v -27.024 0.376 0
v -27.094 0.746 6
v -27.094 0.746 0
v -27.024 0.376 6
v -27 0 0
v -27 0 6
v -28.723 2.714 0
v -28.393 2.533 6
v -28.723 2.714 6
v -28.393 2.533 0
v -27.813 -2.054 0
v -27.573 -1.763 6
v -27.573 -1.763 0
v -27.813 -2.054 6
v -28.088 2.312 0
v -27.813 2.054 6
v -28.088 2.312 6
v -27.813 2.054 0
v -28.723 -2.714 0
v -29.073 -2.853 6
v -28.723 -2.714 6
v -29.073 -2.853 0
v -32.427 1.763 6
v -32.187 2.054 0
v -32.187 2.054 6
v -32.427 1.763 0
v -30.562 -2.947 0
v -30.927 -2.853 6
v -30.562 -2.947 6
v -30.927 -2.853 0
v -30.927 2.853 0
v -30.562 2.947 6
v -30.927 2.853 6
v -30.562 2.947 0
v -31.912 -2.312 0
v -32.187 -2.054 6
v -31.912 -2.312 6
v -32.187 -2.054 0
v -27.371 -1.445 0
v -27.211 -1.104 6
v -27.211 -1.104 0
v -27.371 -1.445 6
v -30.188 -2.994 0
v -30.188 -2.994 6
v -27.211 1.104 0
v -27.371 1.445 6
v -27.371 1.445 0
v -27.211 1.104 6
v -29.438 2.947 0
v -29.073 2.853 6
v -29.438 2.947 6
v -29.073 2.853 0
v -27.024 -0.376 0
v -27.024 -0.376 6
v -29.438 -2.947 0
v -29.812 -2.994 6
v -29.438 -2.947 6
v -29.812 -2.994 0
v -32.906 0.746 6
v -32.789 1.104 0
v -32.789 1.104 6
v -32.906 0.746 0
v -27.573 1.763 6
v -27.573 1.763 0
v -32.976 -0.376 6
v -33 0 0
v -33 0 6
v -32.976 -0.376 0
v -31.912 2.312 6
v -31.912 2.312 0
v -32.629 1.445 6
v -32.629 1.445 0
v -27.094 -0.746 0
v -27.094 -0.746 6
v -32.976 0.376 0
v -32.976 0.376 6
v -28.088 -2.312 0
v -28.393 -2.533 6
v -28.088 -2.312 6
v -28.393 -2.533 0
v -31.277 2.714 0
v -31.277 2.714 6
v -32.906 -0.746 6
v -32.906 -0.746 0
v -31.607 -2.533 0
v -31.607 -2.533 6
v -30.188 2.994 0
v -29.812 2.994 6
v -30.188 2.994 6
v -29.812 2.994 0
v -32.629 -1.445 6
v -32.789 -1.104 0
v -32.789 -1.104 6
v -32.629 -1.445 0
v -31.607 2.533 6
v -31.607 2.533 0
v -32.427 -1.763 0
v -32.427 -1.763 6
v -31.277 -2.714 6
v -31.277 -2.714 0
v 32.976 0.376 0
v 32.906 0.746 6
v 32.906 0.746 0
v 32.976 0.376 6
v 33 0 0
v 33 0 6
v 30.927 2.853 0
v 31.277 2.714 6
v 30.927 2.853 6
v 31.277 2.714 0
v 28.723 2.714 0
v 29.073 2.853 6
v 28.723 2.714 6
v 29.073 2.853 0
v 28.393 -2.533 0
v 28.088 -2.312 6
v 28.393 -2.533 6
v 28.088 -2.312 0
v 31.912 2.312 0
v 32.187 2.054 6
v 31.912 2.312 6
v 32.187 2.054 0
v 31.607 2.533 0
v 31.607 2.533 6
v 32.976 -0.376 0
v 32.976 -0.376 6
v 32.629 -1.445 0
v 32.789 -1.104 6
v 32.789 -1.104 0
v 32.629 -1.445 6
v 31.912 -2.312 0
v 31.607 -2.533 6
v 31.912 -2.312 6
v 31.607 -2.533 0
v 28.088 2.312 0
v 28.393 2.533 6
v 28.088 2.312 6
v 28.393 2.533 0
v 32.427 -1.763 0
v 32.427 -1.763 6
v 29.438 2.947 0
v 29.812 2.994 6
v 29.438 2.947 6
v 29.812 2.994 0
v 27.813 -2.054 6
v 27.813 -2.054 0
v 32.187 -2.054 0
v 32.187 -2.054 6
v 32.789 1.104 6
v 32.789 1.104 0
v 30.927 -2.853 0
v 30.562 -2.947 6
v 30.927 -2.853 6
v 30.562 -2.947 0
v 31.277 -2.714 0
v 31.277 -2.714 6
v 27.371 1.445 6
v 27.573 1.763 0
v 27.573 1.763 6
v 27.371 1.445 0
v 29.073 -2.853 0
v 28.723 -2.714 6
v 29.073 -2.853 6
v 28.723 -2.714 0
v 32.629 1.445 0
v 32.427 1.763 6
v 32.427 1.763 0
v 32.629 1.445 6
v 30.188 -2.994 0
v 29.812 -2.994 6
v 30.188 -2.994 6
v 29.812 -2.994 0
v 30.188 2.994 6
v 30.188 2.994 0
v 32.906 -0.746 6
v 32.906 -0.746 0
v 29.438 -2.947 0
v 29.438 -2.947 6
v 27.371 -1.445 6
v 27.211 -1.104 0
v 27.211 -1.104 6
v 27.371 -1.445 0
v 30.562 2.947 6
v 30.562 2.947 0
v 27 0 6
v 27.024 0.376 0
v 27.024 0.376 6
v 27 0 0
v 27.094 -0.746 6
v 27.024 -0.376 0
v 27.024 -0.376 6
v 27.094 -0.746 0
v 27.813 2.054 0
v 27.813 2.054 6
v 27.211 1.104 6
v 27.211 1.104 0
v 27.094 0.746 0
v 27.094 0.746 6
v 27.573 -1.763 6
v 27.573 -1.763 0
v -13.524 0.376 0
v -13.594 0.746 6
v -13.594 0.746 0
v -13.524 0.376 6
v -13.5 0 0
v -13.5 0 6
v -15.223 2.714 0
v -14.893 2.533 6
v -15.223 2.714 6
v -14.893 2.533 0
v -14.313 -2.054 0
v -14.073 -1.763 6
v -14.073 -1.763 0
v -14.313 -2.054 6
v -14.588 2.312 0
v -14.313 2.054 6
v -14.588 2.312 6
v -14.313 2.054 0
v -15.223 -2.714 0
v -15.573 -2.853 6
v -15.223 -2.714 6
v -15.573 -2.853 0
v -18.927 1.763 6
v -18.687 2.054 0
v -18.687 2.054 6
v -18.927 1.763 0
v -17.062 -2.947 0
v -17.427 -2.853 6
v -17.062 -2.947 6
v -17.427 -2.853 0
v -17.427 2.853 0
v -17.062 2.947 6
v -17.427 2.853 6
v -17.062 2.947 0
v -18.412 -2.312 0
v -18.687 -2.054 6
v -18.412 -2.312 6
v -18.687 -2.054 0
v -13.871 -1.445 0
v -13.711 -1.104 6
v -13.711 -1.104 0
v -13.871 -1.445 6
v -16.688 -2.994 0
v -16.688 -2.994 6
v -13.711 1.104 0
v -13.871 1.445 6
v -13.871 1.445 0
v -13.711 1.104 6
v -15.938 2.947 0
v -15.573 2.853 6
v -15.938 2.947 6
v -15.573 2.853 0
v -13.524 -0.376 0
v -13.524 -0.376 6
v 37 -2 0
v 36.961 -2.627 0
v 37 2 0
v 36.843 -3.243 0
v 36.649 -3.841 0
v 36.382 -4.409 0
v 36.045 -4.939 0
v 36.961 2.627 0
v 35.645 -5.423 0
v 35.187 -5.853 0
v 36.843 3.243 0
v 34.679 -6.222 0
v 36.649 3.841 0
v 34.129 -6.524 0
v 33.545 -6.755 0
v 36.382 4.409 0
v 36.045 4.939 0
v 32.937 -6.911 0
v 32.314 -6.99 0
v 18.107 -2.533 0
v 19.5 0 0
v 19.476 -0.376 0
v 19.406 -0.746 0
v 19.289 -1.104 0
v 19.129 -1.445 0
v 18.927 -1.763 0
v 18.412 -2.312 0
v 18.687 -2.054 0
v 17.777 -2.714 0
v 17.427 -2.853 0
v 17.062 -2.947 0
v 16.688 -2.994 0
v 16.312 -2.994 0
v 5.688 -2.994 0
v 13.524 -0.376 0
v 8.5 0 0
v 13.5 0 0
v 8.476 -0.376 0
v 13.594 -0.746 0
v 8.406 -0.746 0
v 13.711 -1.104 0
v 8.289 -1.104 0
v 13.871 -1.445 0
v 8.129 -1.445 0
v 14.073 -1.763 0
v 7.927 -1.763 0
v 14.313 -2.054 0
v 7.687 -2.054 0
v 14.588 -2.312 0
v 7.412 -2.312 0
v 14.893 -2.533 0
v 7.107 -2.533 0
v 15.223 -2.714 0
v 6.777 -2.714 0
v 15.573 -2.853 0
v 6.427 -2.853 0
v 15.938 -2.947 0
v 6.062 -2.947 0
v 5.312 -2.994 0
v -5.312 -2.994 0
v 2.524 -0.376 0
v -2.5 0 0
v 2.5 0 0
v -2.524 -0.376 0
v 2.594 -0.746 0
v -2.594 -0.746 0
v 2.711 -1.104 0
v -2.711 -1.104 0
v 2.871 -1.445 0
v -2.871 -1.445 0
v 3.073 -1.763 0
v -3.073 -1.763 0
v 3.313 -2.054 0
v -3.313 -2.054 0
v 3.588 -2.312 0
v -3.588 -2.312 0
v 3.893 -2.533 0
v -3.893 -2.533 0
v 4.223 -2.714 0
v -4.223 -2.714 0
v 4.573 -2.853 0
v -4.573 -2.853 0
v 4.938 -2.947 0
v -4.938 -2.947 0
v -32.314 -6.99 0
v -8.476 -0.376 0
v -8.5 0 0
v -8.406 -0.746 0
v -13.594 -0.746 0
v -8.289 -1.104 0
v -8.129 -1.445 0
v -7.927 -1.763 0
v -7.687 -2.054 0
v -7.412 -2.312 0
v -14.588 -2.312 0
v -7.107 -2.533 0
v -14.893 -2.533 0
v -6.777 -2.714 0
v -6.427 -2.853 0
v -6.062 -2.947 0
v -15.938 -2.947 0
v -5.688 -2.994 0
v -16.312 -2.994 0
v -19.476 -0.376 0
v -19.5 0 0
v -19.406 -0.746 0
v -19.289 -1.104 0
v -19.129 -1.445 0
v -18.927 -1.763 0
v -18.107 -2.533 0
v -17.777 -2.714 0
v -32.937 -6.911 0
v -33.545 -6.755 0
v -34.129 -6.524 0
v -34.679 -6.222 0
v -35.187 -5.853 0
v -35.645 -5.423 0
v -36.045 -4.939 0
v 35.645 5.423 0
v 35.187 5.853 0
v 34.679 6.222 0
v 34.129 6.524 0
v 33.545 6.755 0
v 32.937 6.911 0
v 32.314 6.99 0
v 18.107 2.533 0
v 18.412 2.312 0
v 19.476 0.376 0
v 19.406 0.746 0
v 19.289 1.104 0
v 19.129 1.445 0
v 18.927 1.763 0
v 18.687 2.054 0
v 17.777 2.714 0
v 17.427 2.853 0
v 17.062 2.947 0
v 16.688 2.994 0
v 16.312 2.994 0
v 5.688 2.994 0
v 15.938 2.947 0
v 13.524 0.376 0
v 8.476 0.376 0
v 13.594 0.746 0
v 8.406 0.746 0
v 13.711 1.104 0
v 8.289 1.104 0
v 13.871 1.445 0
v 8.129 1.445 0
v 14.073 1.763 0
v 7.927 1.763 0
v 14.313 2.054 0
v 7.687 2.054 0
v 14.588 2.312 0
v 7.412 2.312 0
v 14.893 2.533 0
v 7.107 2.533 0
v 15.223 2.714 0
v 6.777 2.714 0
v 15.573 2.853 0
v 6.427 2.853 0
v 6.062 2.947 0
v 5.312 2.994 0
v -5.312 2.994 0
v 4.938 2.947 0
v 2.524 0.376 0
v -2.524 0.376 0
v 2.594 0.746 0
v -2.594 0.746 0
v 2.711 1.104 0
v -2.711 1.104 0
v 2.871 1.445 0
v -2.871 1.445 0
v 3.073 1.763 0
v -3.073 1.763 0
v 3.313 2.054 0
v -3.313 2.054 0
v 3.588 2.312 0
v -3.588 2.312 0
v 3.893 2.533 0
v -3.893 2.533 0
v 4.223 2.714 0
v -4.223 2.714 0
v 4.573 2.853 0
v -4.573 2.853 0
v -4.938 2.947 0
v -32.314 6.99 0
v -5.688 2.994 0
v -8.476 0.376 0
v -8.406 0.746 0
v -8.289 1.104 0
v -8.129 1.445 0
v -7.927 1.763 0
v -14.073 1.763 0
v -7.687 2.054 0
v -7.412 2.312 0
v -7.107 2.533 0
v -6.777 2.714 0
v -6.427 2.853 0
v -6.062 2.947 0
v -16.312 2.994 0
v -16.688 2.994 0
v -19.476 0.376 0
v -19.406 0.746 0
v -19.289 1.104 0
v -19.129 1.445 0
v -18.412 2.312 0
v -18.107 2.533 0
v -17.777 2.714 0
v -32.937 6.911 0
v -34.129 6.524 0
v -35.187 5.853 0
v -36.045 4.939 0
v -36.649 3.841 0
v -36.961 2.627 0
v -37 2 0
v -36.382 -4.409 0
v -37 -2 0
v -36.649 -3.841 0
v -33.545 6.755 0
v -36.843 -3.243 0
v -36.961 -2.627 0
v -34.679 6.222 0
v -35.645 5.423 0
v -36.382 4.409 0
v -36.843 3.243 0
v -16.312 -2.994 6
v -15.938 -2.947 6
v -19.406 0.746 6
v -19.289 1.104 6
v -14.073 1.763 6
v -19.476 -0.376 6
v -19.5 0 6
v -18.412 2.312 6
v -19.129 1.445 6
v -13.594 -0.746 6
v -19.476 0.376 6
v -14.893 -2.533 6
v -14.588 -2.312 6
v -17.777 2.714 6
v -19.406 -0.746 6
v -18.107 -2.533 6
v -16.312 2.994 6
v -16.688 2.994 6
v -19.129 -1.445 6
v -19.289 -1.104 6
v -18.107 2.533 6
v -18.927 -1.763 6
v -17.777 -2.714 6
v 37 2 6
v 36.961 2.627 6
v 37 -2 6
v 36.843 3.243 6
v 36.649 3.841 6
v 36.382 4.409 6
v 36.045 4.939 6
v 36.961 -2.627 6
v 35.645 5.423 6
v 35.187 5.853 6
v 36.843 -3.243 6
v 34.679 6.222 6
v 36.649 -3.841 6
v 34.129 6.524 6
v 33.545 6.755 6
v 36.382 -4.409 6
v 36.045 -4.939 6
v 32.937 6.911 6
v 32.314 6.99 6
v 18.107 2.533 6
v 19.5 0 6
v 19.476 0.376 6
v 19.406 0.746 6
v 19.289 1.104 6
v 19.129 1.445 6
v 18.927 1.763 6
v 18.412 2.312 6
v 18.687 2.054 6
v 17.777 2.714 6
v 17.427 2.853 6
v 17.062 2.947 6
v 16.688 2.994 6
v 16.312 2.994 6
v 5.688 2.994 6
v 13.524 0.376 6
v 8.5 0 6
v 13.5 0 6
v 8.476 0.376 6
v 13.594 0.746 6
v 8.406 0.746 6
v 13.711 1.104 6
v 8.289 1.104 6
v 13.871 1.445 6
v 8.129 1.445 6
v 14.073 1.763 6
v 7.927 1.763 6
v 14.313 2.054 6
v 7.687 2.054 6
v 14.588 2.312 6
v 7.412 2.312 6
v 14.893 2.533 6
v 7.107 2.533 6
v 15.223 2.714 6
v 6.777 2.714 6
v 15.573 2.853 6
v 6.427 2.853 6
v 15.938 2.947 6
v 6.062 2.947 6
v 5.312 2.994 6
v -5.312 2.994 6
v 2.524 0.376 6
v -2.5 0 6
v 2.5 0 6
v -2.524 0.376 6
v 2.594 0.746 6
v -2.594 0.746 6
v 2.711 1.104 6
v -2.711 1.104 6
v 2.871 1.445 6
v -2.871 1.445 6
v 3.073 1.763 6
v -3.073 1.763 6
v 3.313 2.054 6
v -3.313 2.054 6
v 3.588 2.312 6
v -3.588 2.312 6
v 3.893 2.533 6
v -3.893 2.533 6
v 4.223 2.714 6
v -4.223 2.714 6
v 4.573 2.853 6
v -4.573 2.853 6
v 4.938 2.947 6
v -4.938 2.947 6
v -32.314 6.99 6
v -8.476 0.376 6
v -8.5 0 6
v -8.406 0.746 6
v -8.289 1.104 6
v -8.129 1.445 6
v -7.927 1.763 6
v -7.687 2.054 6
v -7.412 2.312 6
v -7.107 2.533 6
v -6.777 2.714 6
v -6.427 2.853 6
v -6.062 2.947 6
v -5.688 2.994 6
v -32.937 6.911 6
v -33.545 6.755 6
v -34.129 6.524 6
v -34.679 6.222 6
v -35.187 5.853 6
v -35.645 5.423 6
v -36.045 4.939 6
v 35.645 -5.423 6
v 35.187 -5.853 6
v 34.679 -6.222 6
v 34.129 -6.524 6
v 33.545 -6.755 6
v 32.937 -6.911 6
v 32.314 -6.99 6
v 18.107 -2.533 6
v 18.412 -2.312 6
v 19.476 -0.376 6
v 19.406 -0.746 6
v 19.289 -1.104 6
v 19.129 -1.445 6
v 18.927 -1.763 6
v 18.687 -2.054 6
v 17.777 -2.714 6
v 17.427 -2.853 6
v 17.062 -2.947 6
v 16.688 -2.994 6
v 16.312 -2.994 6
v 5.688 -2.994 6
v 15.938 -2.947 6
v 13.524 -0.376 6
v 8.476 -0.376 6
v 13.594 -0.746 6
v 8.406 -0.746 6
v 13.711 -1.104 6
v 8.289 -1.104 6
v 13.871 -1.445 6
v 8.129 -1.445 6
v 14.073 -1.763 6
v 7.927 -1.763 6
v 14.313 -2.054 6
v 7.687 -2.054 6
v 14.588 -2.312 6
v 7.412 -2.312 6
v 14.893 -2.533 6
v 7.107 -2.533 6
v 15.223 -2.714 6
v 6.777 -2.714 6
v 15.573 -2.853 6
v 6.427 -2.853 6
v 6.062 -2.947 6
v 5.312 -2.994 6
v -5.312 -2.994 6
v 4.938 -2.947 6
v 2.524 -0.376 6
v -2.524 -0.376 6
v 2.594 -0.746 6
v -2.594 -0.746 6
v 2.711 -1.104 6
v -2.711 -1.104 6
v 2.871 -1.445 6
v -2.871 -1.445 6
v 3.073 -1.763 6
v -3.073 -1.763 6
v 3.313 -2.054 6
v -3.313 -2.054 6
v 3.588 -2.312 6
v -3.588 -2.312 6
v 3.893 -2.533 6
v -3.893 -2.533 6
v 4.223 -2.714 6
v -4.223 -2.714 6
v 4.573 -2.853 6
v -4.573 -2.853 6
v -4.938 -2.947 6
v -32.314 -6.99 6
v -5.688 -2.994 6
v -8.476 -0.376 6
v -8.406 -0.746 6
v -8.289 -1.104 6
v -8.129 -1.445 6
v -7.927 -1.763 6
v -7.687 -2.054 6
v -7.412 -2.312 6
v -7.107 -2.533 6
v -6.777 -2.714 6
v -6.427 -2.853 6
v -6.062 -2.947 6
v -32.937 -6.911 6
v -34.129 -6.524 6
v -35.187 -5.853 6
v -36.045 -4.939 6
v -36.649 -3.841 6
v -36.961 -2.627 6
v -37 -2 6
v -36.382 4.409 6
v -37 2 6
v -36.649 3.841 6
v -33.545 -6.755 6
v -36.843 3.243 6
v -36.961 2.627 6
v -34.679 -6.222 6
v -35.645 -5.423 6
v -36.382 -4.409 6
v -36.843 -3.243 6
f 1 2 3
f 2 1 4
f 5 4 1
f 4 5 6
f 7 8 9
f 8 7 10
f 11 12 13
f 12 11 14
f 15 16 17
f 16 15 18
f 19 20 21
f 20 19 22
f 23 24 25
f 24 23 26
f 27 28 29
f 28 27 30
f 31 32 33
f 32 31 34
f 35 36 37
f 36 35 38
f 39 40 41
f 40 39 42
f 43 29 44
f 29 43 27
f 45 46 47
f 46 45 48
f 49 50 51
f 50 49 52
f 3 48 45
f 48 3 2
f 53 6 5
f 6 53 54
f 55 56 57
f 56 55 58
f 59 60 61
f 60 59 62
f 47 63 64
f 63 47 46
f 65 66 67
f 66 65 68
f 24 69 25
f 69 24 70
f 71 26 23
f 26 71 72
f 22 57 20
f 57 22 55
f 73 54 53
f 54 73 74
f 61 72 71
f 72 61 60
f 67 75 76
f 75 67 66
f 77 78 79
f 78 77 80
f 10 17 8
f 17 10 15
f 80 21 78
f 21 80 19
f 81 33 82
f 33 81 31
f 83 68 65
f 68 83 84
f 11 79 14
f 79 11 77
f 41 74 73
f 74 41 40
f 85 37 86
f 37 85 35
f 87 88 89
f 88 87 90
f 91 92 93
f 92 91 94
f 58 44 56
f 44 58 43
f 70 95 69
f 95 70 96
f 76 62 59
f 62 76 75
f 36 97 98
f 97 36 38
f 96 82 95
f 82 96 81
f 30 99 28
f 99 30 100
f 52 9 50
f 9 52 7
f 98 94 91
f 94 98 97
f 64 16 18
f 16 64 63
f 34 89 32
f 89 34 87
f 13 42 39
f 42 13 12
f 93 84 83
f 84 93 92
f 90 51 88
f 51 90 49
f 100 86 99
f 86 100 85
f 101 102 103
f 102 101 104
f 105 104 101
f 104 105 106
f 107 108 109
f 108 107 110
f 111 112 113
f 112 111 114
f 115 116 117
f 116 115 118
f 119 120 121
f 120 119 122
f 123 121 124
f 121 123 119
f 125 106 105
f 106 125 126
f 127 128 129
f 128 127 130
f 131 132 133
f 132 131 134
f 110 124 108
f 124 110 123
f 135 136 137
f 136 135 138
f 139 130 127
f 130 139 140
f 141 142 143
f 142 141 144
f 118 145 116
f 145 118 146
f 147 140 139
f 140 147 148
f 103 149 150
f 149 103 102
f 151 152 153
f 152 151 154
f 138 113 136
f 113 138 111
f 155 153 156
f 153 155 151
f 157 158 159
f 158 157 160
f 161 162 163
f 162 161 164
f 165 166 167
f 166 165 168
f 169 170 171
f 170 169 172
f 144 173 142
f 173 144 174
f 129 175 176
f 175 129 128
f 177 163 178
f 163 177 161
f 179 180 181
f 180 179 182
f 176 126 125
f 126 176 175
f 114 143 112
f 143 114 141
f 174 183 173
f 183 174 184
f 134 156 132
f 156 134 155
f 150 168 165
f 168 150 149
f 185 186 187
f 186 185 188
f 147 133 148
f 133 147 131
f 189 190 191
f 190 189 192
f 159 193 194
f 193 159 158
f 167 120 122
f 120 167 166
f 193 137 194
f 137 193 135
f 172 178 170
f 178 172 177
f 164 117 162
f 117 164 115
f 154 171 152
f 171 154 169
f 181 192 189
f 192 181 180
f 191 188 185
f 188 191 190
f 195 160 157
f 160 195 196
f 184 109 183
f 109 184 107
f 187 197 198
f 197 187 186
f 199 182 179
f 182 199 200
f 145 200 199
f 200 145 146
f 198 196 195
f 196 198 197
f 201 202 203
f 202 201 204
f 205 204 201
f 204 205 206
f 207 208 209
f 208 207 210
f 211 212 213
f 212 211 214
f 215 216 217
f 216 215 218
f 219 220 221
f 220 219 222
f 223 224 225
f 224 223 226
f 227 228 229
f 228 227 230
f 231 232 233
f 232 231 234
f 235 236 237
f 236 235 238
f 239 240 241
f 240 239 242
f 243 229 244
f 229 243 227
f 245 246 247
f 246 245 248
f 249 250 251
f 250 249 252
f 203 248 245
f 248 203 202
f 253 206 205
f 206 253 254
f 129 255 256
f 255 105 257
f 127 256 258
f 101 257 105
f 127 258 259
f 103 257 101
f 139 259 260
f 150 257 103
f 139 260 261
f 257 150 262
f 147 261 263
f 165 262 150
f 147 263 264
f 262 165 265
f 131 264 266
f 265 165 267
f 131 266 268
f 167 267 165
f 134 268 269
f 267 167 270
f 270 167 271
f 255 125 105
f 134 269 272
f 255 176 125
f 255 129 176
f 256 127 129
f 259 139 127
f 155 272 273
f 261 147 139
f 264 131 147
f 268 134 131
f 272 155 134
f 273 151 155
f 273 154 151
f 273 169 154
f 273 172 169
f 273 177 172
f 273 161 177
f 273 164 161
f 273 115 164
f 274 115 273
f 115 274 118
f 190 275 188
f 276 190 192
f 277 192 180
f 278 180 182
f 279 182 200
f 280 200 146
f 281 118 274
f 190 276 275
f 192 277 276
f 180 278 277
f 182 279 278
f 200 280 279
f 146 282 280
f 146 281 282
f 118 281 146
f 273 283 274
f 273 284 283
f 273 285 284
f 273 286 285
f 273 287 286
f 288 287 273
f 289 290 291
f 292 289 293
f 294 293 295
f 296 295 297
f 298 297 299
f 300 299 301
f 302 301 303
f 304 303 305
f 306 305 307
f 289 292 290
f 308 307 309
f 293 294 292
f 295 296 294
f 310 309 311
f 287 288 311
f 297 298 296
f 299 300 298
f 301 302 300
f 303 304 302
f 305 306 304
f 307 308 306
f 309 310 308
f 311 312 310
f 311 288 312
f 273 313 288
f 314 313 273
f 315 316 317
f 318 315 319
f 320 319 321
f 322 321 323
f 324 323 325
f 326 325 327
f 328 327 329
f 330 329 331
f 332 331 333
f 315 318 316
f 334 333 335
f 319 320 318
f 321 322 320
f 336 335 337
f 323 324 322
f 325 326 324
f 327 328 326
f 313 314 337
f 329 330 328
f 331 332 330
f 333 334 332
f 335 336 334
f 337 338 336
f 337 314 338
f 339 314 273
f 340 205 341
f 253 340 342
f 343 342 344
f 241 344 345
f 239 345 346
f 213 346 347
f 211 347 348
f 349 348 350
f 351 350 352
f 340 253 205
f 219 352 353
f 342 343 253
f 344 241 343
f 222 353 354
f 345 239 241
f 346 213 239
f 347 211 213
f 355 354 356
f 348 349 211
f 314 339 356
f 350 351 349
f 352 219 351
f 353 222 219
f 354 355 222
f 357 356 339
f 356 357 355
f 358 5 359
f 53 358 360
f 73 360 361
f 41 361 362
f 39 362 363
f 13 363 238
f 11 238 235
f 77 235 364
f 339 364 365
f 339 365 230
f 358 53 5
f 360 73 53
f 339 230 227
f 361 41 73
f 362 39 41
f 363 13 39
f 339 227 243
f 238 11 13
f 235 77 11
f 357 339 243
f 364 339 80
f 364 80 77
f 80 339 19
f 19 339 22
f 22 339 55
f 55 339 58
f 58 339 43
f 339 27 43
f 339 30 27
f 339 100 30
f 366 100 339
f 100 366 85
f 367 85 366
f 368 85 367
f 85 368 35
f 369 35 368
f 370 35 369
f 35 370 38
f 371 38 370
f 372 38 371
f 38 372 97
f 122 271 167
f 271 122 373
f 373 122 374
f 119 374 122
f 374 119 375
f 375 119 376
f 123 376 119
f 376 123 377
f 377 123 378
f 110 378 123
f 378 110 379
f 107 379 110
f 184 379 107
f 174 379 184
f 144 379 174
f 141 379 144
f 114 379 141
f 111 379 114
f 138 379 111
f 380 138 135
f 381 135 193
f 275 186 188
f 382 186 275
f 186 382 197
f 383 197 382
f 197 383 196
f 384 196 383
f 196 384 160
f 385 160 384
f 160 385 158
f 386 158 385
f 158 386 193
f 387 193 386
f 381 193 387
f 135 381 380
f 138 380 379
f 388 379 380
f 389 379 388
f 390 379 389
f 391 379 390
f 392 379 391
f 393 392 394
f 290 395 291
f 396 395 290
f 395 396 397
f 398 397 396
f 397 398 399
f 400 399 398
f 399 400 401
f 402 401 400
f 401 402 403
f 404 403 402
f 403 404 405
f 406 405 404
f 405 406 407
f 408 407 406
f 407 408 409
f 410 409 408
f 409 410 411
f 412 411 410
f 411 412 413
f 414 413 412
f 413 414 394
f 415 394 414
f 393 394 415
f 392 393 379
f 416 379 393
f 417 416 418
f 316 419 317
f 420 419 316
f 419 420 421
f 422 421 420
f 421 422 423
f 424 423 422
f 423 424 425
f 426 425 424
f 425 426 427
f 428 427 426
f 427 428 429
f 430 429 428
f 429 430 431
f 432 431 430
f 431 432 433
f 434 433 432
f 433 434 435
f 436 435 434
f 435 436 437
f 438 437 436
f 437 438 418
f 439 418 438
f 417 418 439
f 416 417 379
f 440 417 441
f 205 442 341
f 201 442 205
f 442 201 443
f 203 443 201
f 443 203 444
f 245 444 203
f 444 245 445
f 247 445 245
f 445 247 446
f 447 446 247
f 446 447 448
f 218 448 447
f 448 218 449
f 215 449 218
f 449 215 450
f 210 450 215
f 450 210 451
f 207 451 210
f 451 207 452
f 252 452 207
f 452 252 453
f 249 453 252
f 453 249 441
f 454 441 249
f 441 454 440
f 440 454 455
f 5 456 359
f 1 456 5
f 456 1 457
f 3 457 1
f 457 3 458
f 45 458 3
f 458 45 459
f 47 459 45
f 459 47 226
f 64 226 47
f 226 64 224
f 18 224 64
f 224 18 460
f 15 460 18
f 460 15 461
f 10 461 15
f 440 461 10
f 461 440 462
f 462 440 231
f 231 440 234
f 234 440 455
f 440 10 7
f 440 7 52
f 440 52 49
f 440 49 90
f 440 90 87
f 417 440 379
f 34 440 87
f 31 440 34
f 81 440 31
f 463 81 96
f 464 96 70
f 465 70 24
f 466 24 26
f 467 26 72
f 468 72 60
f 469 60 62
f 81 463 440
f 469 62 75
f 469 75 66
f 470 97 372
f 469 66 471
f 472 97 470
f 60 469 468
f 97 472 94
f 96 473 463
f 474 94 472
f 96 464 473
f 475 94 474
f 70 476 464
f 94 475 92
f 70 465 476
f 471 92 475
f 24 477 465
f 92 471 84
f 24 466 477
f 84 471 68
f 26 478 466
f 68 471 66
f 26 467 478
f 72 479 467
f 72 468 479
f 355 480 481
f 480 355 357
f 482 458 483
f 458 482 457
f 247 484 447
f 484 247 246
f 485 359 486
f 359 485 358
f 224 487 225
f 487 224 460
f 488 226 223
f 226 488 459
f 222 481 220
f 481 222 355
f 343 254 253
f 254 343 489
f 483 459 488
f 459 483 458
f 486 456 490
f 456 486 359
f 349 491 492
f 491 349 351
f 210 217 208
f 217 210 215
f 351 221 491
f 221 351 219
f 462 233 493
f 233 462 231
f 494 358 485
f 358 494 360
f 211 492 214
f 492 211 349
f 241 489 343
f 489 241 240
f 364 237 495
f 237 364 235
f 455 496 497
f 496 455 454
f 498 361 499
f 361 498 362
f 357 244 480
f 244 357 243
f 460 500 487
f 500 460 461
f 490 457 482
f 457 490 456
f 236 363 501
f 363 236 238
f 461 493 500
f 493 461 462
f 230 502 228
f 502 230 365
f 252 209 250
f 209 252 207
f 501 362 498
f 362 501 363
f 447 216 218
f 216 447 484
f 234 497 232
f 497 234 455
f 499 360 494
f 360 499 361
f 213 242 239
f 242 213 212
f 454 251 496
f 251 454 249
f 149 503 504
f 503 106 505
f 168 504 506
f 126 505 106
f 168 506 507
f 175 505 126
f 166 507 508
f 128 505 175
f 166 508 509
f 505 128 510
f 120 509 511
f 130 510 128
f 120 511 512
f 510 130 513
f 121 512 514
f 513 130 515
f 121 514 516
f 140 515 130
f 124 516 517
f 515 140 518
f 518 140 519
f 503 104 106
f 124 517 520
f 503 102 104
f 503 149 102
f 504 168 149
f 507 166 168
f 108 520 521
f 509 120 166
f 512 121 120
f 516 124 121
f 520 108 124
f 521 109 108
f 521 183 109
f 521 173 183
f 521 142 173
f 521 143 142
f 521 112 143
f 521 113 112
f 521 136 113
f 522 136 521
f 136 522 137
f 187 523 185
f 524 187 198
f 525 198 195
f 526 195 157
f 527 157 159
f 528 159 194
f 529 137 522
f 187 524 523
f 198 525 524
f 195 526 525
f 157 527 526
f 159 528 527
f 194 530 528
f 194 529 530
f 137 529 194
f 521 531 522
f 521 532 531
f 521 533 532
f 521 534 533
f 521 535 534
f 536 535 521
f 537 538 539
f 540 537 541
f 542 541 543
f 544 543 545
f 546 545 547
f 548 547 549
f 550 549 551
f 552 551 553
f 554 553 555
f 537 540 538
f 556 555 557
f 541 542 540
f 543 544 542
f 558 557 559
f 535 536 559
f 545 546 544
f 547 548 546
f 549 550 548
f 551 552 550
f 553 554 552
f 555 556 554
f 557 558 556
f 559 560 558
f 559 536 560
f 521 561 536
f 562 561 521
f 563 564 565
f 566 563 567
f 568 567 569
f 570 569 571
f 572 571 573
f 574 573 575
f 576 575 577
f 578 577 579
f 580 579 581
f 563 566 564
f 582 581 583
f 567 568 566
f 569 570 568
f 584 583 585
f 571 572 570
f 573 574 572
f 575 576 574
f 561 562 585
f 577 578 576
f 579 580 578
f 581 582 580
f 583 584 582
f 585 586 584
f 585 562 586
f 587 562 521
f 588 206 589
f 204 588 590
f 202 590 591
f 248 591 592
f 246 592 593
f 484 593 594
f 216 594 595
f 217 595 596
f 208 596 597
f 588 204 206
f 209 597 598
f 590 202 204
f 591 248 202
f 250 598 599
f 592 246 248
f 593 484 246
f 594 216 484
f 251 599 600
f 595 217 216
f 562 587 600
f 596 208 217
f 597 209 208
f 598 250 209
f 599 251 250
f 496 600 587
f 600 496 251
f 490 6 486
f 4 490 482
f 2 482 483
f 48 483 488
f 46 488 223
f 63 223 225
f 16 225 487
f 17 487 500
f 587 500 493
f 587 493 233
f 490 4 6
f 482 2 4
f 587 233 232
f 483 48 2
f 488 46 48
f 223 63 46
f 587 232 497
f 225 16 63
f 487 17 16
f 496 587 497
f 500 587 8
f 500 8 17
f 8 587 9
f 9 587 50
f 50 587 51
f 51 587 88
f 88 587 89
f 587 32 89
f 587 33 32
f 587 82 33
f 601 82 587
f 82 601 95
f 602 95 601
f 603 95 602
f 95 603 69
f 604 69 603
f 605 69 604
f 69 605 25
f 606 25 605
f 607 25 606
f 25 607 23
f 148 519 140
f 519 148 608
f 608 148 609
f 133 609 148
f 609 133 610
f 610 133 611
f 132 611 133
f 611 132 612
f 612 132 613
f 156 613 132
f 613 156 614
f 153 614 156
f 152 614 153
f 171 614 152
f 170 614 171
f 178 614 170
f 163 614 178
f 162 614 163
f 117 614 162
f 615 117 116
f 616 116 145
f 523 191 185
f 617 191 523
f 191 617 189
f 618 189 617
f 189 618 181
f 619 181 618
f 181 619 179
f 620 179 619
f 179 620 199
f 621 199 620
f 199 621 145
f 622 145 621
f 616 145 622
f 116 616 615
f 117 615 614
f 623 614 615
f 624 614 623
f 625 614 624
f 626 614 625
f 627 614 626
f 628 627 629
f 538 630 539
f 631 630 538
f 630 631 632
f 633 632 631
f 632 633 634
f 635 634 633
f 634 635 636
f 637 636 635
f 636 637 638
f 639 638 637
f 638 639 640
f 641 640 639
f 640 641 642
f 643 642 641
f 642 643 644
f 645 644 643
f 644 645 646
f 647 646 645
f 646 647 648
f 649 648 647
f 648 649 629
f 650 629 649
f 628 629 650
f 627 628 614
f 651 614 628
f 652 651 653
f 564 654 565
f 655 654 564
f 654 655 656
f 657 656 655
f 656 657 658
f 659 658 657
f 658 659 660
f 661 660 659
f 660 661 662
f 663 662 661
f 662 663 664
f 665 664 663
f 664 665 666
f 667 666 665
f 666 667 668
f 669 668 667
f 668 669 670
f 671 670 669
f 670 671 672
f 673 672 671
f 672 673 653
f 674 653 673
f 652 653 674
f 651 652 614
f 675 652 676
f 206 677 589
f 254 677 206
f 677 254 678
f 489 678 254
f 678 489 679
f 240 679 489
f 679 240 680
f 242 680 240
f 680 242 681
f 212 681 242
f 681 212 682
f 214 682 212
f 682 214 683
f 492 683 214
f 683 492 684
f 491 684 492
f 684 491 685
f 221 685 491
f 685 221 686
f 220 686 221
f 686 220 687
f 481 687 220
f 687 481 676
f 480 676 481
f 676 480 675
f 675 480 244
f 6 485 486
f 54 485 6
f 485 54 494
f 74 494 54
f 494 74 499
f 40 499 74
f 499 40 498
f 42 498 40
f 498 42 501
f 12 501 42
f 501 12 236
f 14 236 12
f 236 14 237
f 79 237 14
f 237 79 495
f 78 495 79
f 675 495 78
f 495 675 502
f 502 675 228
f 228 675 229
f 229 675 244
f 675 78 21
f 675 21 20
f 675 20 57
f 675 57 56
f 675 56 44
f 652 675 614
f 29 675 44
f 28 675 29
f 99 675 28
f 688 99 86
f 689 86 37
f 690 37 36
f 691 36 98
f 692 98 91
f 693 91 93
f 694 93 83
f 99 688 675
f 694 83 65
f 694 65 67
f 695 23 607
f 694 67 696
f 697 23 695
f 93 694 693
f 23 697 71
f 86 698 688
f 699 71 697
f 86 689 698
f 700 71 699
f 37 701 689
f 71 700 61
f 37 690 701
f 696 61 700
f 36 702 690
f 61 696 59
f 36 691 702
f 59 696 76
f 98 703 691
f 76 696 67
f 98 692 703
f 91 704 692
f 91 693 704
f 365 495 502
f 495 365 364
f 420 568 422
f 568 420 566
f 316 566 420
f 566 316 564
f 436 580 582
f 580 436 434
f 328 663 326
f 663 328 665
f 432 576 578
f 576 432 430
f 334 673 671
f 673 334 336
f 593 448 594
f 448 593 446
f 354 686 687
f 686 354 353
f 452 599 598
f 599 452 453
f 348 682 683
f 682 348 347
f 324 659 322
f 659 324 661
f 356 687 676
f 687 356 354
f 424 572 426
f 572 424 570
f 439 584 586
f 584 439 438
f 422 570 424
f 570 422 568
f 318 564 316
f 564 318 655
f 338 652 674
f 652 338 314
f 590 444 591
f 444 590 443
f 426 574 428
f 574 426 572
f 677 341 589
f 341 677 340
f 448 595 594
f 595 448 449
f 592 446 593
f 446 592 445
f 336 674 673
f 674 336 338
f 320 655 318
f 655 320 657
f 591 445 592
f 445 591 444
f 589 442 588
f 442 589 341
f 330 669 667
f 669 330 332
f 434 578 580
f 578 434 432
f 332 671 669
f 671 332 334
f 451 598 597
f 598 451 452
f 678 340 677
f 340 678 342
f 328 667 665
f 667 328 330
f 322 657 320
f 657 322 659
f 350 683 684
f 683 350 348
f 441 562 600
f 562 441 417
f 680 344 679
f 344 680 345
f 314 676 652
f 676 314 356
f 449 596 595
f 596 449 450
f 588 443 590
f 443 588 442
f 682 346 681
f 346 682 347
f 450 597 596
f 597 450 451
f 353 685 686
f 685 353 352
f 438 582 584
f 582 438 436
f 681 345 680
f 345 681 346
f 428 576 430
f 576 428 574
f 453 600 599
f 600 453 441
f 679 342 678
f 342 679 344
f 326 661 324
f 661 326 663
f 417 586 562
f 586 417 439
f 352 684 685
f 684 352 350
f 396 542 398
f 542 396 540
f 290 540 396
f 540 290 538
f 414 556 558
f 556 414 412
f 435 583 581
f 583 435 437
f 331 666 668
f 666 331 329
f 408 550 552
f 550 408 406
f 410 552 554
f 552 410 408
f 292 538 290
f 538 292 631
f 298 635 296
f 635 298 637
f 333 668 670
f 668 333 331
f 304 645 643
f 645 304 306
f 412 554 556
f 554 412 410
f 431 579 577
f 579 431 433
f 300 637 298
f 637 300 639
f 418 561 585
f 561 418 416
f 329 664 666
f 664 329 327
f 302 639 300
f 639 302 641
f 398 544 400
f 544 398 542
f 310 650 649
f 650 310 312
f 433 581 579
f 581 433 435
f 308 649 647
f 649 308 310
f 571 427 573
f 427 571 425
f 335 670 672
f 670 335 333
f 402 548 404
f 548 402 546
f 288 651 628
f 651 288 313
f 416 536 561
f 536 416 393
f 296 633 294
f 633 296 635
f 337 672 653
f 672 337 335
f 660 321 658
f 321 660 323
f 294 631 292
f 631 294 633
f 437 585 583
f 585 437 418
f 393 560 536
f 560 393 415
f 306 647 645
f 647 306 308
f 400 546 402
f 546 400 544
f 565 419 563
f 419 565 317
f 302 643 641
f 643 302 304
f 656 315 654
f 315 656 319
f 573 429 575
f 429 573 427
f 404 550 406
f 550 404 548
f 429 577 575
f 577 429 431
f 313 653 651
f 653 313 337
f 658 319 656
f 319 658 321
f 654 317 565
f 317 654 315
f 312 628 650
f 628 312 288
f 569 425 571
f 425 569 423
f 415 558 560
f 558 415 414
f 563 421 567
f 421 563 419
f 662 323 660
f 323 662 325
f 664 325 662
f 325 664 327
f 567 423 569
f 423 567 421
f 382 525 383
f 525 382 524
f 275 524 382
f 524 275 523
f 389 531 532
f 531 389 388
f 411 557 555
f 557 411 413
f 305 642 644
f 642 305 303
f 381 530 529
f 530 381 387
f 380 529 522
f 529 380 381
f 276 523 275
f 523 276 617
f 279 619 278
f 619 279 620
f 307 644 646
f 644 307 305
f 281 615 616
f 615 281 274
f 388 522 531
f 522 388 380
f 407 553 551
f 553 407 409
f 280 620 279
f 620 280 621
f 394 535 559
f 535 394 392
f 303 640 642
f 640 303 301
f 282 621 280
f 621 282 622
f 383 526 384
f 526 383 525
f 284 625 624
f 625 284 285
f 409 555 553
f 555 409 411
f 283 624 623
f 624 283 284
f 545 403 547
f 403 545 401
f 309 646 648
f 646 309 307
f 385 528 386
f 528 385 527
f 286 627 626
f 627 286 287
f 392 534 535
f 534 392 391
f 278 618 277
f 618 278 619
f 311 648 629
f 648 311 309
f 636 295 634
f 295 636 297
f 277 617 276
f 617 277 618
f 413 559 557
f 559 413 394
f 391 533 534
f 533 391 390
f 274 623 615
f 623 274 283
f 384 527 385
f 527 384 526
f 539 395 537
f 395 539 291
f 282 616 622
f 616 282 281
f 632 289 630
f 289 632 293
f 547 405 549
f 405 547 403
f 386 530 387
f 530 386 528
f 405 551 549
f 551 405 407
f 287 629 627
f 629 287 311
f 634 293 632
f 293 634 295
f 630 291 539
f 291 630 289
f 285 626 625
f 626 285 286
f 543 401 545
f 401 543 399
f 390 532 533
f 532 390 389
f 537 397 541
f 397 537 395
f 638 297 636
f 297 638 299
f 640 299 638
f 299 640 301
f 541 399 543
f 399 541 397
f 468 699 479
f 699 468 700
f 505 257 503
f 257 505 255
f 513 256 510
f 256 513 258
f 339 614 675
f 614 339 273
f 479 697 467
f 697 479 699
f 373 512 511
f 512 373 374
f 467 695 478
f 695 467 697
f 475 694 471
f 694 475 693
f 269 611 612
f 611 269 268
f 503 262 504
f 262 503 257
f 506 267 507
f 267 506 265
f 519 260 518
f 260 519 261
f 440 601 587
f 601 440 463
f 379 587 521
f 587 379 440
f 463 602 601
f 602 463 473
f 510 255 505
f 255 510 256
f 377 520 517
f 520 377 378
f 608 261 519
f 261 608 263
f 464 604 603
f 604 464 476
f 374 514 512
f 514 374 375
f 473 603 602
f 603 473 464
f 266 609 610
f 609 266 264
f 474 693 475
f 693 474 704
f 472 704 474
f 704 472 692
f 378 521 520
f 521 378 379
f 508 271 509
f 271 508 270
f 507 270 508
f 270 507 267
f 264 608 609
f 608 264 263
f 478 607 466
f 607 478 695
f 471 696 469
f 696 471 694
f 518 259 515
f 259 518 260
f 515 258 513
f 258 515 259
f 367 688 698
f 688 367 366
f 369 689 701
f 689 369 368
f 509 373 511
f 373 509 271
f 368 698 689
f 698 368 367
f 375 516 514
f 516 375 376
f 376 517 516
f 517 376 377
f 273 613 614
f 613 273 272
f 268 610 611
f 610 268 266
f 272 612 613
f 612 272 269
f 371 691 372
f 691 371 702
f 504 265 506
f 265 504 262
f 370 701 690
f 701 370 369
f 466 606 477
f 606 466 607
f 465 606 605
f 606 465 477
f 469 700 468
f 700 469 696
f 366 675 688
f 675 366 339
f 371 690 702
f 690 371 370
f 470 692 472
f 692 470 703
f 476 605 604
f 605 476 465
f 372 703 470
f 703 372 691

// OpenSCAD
$fn = 50;


difference() {
	union() {
		hull() {
			translate(v = [-32.0000000000, 2.0000000000, 0]) {
				cylinder(h = 6, r = 5);
			}
			translate(v = [32.0000000000, 2.0000000000, 0]) {
				cylinder(h = 6, r = 5);
			}
			translate(v = [-32.0000000000, -2.0000000000, 0]) {
				cylinder(h = 6, r = 5);
			}
			translate(v = [32.0000000000, -2.0000000000, 0]) {
				cylinder(h = 6, r = 5);
			}
		}
	}
	union() {
		#translate(v = [-30.0000000000, 0.0000000000, 0]) {
			cylinder(h = 6, r = 3.0000000000);
		}
		#translate(v = [30.0000000000, 0.0000000000, 0]) {
			cylinder(h = 6, r = 3.0000000000);
		}
		#translate(v = [-30.0000000000, 0.0000000000, -100.0000000000]) {
			cylinder(h = 200, r = 3.0000000000);
		}
		#translate(v = [-30.0000000000, 0.0000000000, -100.0000000000]) {
			cylinder(h = 200, r = 3.0000000000);
		}
		#translate(v = [30.0000000000, 0.0000000000, -100.0000000000]) {
			cylinder(h = 200, r = 3.0000000000);
		}
		#translate(v = [30.0000000000, 0.0000000000, -100.0000000000]) {
			cylinder(h = 200, r = 3.0000000000);
		}
		#translate(v = [-30.0000000000, 0.0000000000, 0]) {
			cylinder(h = 6, r = 1.5000000000);
		}
		#translate(v = [30.0000000000, 0.0000000000, 0]) {
			cylinder(h = 6, r = 1.5000000000);
		}
		#translate(v = [-30.0000000000, 0.0000000000, 0]) {
			cylinder(h = 6, r = 1.5000000000);
		}
		#translate(v = [30.0000000000, 0.0000000000, 0]) {
			cylinder(h = 6, r = 1.5000000000);
		}
		#translate(v = [-30.0000000000, 0.0000000000, 0]) {
			cylinder(h = 6, r = 1.5000000000);
		}
		#translate(v = [30.0000000000, 0.0000000000, 0]) {
			cylinder(h = 6, r = 1.5000000000);
		}
		#translate(v = [-16.5000000000, 0, 0]) {
			cylinder(h = 6, r = 3.0000000000);
		}
		#translate(v = [-5.5000000000, 0, 0]) {
			cylinder(h = 6, r = 3.0000000000);
		}
		#translate(v = [5.5000000000, 0, 0]) {
			cylinder(h = 6, r = 3.0000000000);
		}
		#translate(v = [16.5000000000, 0, 0]) {
			cylinder(h = 6, r = 3.0000000000);
		}
	}
}
